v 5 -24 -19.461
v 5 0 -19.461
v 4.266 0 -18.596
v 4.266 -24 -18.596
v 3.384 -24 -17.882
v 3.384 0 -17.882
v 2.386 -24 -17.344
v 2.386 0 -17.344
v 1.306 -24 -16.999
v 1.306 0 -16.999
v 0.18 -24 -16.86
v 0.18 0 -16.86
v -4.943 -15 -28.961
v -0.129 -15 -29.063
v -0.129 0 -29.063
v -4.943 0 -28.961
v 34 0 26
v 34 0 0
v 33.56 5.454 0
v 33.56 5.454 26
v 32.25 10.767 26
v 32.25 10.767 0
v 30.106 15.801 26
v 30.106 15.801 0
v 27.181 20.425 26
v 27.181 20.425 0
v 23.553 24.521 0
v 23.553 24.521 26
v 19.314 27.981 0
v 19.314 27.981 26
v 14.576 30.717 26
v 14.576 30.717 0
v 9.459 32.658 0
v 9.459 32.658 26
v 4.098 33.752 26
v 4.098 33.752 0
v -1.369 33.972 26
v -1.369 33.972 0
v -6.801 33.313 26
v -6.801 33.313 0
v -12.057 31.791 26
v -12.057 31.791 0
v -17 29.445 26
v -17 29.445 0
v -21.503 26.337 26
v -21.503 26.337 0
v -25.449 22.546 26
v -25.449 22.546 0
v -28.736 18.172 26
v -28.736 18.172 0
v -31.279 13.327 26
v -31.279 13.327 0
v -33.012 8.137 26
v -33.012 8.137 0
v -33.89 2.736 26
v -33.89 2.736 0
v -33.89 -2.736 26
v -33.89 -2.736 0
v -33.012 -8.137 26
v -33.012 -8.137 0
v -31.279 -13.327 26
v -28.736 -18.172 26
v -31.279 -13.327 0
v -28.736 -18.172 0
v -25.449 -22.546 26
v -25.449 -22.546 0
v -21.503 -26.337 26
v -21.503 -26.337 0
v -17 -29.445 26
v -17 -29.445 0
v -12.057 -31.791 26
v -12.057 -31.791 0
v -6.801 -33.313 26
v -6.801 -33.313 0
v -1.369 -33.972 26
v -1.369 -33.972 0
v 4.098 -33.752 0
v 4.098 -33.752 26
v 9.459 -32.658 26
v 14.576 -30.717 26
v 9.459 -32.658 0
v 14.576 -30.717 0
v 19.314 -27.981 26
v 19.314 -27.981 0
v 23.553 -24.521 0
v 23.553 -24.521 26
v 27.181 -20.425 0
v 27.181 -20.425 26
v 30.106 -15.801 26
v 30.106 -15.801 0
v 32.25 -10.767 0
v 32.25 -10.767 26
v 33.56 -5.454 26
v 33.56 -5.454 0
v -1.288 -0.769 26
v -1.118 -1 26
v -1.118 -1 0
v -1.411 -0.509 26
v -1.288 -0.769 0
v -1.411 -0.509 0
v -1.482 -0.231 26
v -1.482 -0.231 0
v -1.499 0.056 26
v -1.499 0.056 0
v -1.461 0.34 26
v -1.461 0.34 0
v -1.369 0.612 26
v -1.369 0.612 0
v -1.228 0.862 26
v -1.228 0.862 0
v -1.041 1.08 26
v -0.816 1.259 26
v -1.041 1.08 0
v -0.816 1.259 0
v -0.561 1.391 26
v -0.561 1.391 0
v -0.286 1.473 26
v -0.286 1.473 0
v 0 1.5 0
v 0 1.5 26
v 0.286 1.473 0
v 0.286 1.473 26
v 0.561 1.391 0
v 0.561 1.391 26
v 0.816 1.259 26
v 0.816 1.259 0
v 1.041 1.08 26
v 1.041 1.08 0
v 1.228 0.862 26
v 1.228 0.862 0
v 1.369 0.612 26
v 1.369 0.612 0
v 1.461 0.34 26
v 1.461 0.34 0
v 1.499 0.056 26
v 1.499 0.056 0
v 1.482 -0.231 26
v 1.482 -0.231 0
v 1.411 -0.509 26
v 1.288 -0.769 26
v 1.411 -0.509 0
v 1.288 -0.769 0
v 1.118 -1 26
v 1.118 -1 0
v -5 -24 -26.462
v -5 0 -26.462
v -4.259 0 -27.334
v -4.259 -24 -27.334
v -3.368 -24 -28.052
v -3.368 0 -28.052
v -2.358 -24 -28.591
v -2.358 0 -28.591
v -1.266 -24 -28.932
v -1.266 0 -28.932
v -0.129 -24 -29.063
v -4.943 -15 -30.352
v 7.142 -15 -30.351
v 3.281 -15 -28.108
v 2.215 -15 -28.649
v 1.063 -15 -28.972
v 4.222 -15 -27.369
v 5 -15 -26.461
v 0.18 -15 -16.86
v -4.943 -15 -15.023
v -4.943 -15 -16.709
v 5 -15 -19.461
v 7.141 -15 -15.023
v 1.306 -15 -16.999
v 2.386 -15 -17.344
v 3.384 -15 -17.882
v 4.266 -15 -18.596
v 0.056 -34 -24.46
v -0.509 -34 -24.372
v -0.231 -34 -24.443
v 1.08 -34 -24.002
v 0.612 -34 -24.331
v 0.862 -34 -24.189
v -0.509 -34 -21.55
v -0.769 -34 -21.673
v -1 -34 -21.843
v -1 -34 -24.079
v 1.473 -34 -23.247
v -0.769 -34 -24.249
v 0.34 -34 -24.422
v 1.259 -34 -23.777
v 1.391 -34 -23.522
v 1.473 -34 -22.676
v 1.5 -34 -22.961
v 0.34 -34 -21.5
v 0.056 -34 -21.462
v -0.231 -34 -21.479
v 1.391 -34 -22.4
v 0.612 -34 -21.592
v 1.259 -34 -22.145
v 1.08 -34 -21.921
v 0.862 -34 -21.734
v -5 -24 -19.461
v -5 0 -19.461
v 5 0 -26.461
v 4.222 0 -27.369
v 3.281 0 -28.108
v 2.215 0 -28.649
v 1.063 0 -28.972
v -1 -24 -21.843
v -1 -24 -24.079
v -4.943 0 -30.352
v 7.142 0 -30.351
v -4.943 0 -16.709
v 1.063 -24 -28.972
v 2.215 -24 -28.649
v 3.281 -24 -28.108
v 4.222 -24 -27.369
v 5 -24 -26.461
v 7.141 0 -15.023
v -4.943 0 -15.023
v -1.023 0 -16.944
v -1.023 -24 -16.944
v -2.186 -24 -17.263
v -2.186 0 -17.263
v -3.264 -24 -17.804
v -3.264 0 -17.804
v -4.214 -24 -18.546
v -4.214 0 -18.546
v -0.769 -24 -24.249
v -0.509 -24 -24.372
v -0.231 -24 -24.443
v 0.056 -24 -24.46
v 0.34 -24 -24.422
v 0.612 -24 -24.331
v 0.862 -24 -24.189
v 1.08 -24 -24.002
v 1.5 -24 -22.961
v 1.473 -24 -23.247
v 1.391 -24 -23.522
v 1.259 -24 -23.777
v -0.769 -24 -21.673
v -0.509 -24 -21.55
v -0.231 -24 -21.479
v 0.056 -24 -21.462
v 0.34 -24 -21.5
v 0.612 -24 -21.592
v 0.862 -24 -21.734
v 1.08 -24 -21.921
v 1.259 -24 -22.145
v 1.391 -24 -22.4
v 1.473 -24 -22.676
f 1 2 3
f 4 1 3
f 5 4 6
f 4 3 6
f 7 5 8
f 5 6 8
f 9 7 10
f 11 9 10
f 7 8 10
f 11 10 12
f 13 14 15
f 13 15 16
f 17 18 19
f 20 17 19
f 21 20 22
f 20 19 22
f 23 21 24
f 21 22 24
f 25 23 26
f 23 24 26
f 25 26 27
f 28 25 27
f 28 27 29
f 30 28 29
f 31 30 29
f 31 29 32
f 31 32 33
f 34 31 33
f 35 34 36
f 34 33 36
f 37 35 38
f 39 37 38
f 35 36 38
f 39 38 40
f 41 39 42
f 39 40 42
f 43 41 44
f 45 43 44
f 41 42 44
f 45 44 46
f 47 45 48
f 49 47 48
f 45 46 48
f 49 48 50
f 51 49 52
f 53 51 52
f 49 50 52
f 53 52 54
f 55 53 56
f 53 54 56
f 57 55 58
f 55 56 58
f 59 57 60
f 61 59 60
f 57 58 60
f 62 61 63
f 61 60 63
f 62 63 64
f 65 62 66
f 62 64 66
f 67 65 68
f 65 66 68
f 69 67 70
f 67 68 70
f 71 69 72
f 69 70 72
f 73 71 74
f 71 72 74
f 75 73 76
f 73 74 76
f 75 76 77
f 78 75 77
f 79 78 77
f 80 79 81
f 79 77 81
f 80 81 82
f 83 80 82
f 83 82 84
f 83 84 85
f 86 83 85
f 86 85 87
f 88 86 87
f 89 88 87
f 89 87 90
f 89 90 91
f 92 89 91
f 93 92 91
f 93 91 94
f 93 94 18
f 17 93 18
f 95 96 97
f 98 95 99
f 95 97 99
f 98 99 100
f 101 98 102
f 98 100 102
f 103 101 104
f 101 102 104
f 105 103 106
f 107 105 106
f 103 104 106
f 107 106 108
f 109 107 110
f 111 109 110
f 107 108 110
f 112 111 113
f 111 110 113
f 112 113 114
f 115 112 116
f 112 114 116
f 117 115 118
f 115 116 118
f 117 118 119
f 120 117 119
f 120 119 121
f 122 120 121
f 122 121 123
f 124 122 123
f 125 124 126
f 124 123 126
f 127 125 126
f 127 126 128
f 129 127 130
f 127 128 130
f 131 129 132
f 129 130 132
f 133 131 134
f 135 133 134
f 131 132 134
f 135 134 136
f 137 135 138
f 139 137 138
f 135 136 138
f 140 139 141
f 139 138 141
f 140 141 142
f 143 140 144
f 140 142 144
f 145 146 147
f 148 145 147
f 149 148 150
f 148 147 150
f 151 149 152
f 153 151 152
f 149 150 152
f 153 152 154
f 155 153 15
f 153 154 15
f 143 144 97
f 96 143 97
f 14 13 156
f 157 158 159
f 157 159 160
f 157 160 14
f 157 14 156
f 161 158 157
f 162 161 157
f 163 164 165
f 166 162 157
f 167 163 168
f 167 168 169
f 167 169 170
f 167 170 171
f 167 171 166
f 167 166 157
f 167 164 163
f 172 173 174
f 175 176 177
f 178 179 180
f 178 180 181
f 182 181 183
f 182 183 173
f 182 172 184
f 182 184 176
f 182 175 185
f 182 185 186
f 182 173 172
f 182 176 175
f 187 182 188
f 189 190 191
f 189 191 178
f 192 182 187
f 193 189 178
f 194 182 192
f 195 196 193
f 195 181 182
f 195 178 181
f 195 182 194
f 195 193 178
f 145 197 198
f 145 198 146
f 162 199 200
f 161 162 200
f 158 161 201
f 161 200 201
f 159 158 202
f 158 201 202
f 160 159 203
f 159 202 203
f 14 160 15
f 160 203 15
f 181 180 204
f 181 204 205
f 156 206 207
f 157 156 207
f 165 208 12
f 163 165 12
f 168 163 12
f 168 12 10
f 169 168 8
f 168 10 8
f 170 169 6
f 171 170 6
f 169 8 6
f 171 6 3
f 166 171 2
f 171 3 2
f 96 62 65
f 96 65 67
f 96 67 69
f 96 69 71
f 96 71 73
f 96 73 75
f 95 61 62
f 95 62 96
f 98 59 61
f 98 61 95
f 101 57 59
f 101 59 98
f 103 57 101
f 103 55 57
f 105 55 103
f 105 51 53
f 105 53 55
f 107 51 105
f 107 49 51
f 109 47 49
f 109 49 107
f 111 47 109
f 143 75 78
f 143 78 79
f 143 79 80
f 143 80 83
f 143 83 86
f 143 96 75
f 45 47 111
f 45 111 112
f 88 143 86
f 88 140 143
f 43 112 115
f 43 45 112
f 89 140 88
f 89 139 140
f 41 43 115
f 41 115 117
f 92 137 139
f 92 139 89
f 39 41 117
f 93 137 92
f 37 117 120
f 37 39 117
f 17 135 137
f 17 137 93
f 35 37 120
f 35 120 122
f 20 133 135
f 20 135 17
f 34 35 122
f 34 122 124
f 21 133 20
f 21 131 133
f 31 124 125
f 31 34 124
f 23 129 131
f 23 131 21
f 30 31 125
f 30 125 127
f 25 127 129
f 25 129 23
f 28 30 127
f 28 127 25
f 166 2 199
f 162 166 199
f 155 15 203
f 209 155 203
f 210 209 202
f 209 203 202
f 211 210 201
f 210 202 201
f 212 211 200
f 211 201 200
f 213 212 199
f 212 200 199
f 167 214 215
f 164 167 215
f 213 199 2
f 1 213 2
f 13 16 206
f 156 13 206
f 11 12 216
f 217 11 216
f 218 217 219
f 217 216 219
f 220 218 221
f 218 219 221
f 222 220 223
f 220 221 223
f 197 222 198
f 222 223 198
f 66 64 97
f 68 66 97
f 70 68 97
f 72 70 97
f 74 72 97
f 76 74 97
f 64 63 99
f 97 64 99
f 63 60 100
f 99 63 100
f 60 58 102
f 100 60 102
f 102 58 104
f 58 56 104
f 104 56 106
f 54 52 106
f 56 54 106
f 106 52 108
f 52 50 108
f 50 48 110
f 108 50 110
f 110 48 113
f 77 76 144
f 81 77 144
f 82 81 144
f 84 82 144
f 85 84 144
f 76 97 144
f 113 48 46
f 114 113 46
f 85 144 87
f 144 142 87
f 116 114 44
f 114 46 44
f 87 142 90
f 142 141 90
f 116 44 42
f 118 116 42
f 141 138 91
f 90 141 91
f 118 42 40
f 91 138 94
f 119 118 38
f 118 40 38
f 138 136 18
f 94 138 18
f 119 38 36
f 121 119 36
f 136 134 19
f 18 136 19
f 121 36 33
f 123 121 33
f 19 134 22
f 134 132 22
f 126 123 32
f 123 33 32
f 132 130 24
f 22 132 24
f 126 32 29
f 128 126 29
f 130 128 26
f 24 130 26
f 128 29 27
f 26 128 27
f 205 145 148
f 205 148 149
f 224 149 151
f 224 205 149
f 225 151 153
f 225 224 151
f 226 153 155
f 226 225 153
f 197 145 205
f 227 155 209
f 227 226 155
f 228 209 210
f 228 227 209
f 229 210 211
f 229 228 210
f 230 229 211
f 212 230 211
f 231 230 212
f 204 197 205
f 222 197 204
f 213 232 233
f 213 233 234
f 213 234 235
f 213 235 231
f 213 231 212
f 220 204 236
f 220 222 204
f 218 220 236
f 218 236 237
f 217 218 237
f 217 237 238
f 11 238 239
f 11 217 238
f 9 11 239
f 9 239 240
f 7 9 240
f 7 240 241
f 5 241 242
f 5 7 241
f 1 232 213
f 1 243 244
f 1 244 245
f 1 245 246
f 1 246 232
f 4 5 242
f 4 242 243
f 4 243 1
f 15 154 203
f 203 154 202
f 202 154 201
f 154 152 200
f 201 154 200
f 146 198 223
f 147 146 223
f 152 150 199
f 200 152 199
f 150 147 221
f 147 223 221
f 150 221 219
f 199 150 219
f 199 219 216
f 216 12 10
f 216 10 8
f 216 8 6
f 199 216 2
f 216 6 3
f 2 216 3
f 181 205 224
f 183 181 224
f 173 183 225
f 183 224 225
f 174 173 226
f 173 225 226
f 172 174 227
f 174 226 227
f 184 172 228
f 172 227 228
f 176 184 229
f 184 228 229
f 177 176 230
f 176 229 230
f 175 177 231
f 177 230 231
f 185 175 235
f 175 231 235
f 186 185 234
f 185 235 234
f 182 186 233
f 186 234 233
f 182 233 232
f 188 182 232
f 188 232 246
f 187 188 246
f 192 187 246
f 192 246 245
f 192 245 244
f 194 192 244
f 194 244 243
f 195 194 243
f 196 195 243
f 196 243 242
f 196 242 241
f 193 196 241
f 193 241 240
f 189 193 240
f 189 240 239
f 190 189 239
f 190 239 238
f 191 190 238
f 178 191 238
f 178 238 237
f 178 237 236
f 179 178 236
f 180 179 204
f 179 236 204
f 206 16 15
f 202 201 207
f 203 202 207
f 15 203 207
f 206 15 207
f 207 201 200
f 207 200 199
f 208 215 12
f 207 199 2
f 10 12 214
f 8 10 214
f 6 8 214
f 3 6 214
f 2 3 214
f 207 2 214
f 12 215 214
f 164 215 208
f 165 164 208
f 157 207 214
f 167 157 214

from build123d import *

# Parameters (mm, degrees)
F0_R     = 34
F1_DEPTH = 26
F3_DEPTH = 34
F4_DEPTH = 24
F5_DEPTH = 15


with BuildPart() as f1:
    # F0 (on Top) → F1 (new body)
    with BuildSketch(Plane.XY):
        Circle(F0_R)
        with BuildLine():
            ThreePointArc((-1.118034, -1), (0, 1.5), (1.118034, -1))
            Line((1.118034, -1), (0, -1))
            Line((0, -1), (-1.118034, -1))
        make_face(mode=Mode.SUBTRACT)
    extrude(amount=F1_DEPTH)


with BuildPart() as f3:
    # F2 (on Front) → F3 (new body)
    with BuildSketch(Plane.XZ):
        with BuildLine():
            Line((-1, -22.961324), (-1, -24.079358))
            ThreePointArc((-1, -24.079358), (1.5, -22.961324), (-1, -21.84329))
            Line((-1, -21.84329), (-1, -22.961324))
        make_face()
    extrude(amount=F3_DEPTH)

    # F2 (on Front) → F4 (join)
    with BuildSketch(Plane.XZ):
        with BuildLine():
            Line((5.000182, -26.461451), (4.999818, -19.460676))
            ThreePointArc((4.999818, -19.460676), (2.897828, -17.58961), (0.179813, -16.860473))
            ThreePointArc((0.179813, -16.860473), (-2.7386, -17.506713), (-5.000182, -19.461196))
            Line((-5.000182, -19.461196), (-4.999818, -26.461971))
            ThreePointArc((-4.999818, -26.461971), (-2.875575, -28.344982), (-0.129316, -29.063454))
            ThreePointArc((-0.129316, -29.063454), (2.761148, -28.404556), (5.000182, -26.461451))
        make_face()
        with BuildLine():
            ThreePointArc((-1, -21.84329), (1.5, -22.961324), (-1, -24.079358))
            Line((-1, -24.079358), (-1, -22.961324))
            Line((-1, -22.961324), (-1, -21.84329))
        make_face(mode=Mode.SUBTRACT)
    extrude(amount=F4_DEPTH)


with BuildPart() as f5:
    # F2 (on Front) → F5 (new body)
    with BuildSketch(Plane.XZ):
        Polygon((4.99969, -17.002531), (4.999818, -19.460676), (5.000182, -26.461451), (4.999818, -29.17215), (-0.129316, -29.063454), (-4.943248, -28.961437), (-4.943248, -30.351656), (7.141596, -30.351028), (7.140798, -15.022781), (-4.943248, -15.023409), (-4.943248, -16.709479), (0.179813, -16.860473), align=None)
        with BuildLine():
            Line((4.999818, -29.17215), (5.000182, -26.461451))
            ThreePointArc((5.000182, -26.461451), (2.761148, -28.404556), (-0.129316, -29.063454))
            Line((-0.129316, -29.063454), (4.999818, -29.17215))
        make_face()
        with BuildLine():
            ThreePointArc((0.179813, -16.860473), (2.897828, -17.58961), (4.999818, -19.460676))
            Line((4.999818, -19.460676), (4.99969, -17.002531))
            Line((4.99969, -17.002531), (0.179813, -16.860473))
        make_face()
    extrude(amount=F5_DEPTH)


solid = Compound([f1.part, f3.part, f5.part])
